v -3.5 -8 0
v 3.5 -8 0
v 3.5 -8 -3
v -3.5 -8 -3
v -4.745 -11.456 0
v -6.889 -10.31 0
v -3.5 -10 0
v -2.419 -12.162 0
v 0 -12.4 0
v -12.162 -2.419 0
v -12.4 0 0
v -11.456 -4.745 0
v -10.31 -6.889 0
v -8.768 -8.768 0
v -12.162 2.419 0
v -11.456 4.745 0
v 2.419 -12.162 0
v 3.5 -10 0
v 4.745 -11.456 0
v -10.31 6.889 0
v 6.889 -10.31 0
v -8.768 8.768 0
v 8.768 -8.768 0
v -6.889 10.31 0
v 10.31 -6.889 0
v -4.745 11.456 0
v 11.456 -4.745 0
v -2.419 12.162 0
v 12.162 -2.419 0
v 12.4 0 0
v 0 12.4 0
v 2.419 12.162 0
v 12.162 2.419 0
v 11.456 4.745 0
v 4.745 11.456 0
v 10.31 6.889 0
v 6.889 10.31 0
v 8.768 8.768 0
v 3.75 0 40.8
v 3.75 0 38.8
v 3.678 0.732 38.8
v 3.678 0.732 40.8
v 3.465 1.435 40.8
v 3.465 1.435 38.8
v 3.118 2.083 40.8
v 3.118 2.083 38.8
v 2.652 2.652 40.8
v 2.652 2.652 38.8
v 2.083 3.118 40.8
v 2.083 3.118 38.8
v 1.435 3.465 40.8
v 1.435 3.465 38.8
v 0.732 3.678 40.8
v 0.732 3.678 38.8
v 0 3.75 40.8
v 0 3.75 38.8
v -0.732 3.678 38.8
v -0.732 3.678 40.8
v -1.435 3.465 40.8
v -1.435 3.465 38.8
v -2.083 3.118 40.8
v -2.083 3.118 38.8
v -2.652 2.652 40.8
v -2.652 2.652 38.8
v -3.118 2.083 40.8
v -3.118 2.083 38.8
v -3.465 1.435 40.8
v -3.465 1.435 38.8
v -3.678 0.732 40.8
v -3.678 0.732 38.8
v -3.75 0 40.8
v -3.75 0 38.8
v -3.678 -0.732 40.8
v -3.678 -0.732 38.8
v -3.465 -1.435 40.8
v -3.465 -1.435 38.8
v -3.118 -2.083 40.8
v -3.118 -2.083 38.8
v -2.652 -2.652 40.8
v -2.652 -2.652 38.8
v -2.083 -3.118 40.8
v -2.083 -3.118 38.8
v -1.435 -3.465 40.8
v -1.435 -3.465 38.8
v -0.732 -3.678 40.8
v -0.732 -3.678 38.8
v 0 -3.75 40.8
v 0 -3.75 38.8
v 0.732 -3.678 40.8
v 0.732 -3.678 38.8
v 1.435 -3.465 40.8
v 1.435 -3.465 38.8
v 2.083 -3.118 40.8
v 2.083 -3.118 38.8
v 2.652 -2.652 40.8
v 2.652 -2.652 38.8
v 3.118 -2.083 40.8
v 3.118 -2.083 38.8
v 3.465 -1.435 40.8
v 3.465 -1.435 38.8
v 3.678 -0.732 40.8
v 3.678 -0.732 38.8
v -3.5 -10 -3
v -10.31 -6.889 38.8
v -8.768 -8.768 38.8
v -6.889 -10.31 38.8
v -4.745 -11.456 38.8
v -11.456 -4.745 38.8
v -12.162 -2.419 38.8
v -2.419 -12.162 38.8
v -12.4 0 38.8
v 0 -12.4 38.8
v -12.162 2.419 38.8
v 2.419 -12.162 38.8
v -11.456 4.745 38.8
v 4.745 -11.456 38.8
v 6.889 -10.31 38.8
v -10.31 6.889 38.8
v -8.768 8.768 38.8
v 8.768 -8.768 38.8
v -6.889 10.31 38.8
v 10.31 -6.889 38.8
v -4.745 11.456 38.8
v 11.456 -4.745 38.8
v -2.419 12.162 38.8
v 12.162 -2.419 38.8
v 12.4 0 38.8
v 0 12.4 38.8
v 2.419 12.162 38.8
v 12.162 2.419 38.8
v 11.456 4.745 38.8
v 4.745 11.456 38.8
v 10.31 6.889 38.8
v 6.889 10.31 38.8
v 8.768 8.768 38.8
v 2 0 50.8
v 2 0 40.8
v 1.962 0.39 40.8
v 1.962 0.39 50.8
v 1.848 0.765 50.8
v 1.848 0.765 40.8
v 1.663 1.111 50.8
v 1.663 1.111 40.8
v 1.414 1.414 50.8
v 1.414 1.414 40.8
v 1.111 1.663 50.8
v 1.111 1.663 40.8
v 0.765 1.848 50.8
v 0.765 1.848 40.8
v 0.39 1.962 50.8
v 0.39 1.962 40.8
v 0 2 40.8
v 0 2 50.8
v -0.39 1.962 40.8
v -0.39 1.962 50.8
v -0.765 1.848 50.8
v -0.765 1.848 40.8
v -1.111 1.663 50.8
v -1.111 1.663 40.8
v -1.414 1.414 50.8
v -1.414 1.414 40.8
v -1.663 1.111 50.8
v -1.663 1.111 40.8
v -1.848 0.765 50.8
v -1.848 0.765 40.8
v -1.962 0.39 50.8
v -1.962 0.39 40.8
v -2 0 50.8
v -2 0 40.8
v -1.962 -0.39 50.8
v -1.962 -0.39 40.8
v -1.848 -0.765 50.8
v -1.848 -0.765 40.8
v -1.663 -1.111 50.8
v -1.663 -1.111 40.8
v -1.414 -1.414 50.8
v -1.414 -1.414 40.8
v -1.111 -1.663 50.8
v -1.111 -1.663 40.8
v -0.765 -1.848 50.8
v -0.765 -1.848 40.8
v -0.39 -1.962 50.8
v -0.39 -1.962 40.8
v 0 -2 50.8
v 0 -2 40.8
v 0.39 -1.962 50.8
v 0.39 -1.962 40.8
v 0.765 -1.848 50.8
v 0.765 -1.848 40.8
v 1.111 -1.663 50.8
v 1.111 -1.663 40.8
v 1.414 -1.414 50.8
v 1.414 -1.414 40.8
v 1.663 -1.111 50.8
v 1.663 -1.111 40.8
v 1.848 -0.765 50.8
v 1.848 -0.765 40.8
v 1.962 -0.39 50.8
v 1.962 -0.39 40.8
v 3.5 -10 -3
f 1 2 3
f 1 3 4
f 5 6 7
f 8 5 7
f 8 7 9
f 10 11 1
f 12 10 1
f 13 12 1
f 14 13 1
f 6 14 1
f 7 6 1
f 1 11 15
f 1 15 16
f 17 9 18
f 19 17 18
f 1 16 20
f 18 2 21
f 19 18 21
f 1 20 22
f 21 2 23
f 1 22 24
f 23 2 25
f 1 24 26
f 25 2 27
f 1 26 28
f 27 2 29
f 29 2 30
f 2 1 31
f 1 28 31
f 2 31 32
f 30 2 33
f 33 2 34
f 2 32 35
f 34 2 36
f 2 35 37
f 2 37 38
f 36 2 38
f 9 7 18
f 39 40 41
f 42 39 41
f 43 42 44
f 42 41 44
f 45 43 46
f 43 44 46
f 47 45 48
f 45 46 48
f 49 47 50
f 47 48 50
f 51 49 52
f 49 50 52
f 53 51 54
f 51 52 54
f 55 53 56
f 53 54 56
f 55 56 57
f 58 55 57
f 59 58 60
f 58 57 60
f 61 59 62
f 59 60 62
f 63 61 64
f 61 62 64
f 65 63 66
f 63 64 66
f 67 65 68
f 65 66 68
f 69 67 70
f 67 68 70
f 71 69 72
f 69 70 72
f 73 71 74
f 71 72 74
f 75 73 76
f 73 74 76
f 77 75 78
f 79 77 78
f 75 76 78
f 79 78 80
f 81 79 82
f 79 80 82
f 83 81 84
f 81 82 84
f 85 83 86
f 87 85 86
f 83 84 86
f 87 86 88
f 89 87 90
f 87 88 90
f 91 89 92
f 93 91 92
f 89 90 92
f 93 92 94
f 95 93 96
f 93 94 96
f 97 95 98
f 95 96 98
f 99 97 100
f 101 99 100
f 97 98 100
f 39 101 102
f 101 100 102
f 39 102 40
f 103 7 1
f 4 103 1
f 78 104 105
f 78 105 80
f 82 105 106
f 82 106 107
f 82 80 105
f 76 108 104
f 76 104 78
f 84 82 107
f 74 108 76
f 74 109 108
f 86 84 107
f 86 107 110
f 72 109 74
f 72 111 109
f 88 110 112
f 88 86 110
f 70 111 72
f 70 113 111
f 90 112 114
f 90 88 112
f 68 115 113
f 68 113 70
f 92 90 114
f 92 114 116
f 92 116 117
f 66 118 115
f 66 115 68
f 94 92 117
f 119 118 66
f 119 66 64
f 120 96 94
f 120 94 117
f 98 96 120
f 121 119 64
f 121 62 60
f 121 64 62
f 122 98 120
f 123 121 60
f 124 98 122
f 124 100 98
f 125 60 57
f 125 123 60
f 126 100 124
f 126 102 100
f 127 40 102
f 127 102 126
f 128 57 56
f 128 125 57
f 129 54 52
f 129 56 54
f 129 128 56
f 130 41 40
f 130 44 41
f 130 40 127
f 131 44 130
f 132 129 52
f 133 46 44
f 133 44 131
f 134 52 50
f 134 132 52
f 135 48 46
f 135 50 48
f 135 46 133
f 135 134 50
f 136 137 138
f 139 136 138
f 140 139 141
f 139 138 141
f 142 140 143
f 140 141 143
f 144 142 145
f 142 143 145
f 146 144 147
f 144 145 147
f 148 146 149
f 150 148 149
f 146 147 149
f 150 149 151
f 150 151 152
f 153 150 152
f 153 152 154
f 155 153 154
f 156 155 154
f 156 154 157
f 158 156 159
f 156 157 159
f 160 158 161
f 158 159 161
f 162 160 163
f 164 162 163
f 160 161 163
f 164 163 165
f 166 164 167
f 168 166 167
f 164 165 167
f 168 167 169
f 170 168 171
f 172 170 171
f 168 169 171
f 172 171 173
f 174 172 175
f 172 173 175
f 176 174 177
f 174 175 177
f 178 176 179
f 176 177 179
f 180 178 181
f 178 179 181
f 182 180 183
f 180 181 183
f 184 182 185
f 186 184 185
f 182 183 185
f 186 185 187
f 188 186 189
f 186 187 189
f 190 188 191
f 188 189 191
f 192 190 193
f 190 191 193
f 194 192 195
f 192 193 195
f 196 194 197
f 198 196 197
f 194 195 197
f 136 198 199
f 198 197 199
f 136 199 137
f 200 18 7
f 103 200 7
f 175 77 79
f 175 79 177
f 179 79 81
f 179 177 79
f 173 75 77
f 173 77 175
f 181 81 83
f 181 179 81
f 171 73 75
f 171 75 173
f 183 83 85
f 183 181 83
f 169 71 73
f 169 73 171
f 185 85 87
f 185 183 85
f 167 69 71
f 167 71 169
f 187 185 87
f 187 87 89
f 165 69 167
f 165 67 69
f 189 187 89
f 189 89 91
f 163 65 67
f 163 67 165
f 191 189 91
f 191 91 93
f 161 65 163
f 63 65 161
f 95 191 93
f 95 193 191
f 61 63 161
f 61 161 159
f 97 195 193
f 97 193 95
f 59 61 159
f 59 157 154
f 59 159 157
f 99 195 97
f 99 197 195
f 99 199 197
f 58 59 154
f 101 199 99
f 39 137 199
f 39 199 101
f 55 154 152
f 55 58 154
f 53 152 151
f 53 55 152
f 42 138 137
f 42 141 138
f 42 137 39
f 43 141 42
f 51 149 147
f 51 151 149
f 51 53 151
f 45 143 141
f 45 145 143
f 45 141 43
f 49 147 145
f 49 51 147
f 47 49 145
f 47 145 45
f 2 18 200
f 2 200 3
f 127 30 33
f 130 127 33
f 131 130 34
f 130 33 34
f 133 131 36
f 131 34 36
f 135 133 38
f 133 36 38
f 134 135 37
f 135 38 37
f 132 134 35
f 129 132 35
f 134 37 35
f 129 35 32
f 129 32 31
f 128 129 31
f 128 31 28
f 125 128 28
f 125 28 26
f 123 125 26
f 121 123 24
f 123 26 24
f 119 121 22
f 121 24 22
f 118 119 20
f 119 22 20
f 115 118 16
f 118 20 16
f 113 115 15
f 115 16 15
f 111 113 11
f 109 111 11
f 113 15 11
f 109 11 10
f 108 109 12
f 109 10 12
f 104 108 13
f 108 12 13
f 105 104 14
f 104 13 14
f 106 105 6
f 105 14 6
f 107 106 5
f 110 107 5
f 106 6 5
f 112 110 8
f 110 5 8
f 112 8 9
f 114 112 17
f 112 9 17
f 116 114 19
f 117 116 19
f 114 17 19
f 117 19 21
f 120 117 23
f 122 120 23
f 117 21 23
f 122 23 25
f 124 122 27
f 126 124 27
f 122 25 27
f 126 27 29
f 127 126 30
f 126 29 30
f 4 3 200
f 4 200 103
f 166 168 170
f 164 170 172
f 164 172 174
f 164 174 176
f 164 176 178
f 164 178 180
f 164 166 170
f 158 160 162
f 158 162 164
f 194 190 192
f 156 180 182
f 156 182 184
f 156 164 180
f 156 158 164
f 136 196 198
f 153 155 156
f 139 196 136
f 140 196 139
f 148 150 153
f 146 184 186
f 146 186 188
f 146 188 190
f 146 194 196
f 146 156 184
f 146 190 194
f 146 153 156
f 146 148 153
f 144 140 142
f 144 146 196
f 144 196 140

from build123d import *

# Parameters (mm, degrees)
SKIZZE1_R                       = 12.4
AUFSATZ_LINEAR_AUSTRAGEN1_DEPTH = 38.8
SKIZZE2_R                       = 3.75
AUFSATZ_LINEAR_AUSTRAGEN2_DEPTH = 2
SKIZZE3_R                       = 2
AUFSATZ_LINEAR_AUSTRAGEN3_DEPTH = 10
SKIZZE4_W                       = 7
SKIZZE4_H                       = 2
AUFSATZ_LINEAR_AUSTRAGEN4_DEPTH = 3


with BuildPart() as part:
    # Skizze1 → Aufsatz-Linear austragen1 (new body)
    with BuildSketch(Plane.XY):
        Circle(SKIZZE1_R)
    extrude(amount=AUFSATZ_LINEAR_AUSTRAGEN1_DEPTH)

    # Skizze2 → Aufsatz-Linear austragen2 (add)
    with BuildSketch(Plane.XY.offset(38.8)):
        Circle(SKIZZE2_R)
    extrude(amount=AUFSATZ_LINEAR_AUSTRAGEN2_DEPTH)

    # Skizze3 → Aufsatz-Linear austragen3 (add)
    with BuildSketch(Plane.XY.offset(40.8)):
        Circle(SKIZZE3_R)
    extrude(amount=AUFSATZ_LINEAR_AUSTRAGEN3_DEPTH)

    # Skizze4 → Aufsatz-Linear austragen4 (add)
    with BuildSketch(Plane(origin=(0, 0, 0), x_dir=(-1, 0, 0), z_dir=(0, 0, -1))):
        with Locations((0, -9)):
            Rectangle(SKIZZE4_W, SKIZZE4_H)
    extrude(amount=AUFSATZ_LINEAR_AUSTRAGEN4_DEPTH)


solid = part.part
